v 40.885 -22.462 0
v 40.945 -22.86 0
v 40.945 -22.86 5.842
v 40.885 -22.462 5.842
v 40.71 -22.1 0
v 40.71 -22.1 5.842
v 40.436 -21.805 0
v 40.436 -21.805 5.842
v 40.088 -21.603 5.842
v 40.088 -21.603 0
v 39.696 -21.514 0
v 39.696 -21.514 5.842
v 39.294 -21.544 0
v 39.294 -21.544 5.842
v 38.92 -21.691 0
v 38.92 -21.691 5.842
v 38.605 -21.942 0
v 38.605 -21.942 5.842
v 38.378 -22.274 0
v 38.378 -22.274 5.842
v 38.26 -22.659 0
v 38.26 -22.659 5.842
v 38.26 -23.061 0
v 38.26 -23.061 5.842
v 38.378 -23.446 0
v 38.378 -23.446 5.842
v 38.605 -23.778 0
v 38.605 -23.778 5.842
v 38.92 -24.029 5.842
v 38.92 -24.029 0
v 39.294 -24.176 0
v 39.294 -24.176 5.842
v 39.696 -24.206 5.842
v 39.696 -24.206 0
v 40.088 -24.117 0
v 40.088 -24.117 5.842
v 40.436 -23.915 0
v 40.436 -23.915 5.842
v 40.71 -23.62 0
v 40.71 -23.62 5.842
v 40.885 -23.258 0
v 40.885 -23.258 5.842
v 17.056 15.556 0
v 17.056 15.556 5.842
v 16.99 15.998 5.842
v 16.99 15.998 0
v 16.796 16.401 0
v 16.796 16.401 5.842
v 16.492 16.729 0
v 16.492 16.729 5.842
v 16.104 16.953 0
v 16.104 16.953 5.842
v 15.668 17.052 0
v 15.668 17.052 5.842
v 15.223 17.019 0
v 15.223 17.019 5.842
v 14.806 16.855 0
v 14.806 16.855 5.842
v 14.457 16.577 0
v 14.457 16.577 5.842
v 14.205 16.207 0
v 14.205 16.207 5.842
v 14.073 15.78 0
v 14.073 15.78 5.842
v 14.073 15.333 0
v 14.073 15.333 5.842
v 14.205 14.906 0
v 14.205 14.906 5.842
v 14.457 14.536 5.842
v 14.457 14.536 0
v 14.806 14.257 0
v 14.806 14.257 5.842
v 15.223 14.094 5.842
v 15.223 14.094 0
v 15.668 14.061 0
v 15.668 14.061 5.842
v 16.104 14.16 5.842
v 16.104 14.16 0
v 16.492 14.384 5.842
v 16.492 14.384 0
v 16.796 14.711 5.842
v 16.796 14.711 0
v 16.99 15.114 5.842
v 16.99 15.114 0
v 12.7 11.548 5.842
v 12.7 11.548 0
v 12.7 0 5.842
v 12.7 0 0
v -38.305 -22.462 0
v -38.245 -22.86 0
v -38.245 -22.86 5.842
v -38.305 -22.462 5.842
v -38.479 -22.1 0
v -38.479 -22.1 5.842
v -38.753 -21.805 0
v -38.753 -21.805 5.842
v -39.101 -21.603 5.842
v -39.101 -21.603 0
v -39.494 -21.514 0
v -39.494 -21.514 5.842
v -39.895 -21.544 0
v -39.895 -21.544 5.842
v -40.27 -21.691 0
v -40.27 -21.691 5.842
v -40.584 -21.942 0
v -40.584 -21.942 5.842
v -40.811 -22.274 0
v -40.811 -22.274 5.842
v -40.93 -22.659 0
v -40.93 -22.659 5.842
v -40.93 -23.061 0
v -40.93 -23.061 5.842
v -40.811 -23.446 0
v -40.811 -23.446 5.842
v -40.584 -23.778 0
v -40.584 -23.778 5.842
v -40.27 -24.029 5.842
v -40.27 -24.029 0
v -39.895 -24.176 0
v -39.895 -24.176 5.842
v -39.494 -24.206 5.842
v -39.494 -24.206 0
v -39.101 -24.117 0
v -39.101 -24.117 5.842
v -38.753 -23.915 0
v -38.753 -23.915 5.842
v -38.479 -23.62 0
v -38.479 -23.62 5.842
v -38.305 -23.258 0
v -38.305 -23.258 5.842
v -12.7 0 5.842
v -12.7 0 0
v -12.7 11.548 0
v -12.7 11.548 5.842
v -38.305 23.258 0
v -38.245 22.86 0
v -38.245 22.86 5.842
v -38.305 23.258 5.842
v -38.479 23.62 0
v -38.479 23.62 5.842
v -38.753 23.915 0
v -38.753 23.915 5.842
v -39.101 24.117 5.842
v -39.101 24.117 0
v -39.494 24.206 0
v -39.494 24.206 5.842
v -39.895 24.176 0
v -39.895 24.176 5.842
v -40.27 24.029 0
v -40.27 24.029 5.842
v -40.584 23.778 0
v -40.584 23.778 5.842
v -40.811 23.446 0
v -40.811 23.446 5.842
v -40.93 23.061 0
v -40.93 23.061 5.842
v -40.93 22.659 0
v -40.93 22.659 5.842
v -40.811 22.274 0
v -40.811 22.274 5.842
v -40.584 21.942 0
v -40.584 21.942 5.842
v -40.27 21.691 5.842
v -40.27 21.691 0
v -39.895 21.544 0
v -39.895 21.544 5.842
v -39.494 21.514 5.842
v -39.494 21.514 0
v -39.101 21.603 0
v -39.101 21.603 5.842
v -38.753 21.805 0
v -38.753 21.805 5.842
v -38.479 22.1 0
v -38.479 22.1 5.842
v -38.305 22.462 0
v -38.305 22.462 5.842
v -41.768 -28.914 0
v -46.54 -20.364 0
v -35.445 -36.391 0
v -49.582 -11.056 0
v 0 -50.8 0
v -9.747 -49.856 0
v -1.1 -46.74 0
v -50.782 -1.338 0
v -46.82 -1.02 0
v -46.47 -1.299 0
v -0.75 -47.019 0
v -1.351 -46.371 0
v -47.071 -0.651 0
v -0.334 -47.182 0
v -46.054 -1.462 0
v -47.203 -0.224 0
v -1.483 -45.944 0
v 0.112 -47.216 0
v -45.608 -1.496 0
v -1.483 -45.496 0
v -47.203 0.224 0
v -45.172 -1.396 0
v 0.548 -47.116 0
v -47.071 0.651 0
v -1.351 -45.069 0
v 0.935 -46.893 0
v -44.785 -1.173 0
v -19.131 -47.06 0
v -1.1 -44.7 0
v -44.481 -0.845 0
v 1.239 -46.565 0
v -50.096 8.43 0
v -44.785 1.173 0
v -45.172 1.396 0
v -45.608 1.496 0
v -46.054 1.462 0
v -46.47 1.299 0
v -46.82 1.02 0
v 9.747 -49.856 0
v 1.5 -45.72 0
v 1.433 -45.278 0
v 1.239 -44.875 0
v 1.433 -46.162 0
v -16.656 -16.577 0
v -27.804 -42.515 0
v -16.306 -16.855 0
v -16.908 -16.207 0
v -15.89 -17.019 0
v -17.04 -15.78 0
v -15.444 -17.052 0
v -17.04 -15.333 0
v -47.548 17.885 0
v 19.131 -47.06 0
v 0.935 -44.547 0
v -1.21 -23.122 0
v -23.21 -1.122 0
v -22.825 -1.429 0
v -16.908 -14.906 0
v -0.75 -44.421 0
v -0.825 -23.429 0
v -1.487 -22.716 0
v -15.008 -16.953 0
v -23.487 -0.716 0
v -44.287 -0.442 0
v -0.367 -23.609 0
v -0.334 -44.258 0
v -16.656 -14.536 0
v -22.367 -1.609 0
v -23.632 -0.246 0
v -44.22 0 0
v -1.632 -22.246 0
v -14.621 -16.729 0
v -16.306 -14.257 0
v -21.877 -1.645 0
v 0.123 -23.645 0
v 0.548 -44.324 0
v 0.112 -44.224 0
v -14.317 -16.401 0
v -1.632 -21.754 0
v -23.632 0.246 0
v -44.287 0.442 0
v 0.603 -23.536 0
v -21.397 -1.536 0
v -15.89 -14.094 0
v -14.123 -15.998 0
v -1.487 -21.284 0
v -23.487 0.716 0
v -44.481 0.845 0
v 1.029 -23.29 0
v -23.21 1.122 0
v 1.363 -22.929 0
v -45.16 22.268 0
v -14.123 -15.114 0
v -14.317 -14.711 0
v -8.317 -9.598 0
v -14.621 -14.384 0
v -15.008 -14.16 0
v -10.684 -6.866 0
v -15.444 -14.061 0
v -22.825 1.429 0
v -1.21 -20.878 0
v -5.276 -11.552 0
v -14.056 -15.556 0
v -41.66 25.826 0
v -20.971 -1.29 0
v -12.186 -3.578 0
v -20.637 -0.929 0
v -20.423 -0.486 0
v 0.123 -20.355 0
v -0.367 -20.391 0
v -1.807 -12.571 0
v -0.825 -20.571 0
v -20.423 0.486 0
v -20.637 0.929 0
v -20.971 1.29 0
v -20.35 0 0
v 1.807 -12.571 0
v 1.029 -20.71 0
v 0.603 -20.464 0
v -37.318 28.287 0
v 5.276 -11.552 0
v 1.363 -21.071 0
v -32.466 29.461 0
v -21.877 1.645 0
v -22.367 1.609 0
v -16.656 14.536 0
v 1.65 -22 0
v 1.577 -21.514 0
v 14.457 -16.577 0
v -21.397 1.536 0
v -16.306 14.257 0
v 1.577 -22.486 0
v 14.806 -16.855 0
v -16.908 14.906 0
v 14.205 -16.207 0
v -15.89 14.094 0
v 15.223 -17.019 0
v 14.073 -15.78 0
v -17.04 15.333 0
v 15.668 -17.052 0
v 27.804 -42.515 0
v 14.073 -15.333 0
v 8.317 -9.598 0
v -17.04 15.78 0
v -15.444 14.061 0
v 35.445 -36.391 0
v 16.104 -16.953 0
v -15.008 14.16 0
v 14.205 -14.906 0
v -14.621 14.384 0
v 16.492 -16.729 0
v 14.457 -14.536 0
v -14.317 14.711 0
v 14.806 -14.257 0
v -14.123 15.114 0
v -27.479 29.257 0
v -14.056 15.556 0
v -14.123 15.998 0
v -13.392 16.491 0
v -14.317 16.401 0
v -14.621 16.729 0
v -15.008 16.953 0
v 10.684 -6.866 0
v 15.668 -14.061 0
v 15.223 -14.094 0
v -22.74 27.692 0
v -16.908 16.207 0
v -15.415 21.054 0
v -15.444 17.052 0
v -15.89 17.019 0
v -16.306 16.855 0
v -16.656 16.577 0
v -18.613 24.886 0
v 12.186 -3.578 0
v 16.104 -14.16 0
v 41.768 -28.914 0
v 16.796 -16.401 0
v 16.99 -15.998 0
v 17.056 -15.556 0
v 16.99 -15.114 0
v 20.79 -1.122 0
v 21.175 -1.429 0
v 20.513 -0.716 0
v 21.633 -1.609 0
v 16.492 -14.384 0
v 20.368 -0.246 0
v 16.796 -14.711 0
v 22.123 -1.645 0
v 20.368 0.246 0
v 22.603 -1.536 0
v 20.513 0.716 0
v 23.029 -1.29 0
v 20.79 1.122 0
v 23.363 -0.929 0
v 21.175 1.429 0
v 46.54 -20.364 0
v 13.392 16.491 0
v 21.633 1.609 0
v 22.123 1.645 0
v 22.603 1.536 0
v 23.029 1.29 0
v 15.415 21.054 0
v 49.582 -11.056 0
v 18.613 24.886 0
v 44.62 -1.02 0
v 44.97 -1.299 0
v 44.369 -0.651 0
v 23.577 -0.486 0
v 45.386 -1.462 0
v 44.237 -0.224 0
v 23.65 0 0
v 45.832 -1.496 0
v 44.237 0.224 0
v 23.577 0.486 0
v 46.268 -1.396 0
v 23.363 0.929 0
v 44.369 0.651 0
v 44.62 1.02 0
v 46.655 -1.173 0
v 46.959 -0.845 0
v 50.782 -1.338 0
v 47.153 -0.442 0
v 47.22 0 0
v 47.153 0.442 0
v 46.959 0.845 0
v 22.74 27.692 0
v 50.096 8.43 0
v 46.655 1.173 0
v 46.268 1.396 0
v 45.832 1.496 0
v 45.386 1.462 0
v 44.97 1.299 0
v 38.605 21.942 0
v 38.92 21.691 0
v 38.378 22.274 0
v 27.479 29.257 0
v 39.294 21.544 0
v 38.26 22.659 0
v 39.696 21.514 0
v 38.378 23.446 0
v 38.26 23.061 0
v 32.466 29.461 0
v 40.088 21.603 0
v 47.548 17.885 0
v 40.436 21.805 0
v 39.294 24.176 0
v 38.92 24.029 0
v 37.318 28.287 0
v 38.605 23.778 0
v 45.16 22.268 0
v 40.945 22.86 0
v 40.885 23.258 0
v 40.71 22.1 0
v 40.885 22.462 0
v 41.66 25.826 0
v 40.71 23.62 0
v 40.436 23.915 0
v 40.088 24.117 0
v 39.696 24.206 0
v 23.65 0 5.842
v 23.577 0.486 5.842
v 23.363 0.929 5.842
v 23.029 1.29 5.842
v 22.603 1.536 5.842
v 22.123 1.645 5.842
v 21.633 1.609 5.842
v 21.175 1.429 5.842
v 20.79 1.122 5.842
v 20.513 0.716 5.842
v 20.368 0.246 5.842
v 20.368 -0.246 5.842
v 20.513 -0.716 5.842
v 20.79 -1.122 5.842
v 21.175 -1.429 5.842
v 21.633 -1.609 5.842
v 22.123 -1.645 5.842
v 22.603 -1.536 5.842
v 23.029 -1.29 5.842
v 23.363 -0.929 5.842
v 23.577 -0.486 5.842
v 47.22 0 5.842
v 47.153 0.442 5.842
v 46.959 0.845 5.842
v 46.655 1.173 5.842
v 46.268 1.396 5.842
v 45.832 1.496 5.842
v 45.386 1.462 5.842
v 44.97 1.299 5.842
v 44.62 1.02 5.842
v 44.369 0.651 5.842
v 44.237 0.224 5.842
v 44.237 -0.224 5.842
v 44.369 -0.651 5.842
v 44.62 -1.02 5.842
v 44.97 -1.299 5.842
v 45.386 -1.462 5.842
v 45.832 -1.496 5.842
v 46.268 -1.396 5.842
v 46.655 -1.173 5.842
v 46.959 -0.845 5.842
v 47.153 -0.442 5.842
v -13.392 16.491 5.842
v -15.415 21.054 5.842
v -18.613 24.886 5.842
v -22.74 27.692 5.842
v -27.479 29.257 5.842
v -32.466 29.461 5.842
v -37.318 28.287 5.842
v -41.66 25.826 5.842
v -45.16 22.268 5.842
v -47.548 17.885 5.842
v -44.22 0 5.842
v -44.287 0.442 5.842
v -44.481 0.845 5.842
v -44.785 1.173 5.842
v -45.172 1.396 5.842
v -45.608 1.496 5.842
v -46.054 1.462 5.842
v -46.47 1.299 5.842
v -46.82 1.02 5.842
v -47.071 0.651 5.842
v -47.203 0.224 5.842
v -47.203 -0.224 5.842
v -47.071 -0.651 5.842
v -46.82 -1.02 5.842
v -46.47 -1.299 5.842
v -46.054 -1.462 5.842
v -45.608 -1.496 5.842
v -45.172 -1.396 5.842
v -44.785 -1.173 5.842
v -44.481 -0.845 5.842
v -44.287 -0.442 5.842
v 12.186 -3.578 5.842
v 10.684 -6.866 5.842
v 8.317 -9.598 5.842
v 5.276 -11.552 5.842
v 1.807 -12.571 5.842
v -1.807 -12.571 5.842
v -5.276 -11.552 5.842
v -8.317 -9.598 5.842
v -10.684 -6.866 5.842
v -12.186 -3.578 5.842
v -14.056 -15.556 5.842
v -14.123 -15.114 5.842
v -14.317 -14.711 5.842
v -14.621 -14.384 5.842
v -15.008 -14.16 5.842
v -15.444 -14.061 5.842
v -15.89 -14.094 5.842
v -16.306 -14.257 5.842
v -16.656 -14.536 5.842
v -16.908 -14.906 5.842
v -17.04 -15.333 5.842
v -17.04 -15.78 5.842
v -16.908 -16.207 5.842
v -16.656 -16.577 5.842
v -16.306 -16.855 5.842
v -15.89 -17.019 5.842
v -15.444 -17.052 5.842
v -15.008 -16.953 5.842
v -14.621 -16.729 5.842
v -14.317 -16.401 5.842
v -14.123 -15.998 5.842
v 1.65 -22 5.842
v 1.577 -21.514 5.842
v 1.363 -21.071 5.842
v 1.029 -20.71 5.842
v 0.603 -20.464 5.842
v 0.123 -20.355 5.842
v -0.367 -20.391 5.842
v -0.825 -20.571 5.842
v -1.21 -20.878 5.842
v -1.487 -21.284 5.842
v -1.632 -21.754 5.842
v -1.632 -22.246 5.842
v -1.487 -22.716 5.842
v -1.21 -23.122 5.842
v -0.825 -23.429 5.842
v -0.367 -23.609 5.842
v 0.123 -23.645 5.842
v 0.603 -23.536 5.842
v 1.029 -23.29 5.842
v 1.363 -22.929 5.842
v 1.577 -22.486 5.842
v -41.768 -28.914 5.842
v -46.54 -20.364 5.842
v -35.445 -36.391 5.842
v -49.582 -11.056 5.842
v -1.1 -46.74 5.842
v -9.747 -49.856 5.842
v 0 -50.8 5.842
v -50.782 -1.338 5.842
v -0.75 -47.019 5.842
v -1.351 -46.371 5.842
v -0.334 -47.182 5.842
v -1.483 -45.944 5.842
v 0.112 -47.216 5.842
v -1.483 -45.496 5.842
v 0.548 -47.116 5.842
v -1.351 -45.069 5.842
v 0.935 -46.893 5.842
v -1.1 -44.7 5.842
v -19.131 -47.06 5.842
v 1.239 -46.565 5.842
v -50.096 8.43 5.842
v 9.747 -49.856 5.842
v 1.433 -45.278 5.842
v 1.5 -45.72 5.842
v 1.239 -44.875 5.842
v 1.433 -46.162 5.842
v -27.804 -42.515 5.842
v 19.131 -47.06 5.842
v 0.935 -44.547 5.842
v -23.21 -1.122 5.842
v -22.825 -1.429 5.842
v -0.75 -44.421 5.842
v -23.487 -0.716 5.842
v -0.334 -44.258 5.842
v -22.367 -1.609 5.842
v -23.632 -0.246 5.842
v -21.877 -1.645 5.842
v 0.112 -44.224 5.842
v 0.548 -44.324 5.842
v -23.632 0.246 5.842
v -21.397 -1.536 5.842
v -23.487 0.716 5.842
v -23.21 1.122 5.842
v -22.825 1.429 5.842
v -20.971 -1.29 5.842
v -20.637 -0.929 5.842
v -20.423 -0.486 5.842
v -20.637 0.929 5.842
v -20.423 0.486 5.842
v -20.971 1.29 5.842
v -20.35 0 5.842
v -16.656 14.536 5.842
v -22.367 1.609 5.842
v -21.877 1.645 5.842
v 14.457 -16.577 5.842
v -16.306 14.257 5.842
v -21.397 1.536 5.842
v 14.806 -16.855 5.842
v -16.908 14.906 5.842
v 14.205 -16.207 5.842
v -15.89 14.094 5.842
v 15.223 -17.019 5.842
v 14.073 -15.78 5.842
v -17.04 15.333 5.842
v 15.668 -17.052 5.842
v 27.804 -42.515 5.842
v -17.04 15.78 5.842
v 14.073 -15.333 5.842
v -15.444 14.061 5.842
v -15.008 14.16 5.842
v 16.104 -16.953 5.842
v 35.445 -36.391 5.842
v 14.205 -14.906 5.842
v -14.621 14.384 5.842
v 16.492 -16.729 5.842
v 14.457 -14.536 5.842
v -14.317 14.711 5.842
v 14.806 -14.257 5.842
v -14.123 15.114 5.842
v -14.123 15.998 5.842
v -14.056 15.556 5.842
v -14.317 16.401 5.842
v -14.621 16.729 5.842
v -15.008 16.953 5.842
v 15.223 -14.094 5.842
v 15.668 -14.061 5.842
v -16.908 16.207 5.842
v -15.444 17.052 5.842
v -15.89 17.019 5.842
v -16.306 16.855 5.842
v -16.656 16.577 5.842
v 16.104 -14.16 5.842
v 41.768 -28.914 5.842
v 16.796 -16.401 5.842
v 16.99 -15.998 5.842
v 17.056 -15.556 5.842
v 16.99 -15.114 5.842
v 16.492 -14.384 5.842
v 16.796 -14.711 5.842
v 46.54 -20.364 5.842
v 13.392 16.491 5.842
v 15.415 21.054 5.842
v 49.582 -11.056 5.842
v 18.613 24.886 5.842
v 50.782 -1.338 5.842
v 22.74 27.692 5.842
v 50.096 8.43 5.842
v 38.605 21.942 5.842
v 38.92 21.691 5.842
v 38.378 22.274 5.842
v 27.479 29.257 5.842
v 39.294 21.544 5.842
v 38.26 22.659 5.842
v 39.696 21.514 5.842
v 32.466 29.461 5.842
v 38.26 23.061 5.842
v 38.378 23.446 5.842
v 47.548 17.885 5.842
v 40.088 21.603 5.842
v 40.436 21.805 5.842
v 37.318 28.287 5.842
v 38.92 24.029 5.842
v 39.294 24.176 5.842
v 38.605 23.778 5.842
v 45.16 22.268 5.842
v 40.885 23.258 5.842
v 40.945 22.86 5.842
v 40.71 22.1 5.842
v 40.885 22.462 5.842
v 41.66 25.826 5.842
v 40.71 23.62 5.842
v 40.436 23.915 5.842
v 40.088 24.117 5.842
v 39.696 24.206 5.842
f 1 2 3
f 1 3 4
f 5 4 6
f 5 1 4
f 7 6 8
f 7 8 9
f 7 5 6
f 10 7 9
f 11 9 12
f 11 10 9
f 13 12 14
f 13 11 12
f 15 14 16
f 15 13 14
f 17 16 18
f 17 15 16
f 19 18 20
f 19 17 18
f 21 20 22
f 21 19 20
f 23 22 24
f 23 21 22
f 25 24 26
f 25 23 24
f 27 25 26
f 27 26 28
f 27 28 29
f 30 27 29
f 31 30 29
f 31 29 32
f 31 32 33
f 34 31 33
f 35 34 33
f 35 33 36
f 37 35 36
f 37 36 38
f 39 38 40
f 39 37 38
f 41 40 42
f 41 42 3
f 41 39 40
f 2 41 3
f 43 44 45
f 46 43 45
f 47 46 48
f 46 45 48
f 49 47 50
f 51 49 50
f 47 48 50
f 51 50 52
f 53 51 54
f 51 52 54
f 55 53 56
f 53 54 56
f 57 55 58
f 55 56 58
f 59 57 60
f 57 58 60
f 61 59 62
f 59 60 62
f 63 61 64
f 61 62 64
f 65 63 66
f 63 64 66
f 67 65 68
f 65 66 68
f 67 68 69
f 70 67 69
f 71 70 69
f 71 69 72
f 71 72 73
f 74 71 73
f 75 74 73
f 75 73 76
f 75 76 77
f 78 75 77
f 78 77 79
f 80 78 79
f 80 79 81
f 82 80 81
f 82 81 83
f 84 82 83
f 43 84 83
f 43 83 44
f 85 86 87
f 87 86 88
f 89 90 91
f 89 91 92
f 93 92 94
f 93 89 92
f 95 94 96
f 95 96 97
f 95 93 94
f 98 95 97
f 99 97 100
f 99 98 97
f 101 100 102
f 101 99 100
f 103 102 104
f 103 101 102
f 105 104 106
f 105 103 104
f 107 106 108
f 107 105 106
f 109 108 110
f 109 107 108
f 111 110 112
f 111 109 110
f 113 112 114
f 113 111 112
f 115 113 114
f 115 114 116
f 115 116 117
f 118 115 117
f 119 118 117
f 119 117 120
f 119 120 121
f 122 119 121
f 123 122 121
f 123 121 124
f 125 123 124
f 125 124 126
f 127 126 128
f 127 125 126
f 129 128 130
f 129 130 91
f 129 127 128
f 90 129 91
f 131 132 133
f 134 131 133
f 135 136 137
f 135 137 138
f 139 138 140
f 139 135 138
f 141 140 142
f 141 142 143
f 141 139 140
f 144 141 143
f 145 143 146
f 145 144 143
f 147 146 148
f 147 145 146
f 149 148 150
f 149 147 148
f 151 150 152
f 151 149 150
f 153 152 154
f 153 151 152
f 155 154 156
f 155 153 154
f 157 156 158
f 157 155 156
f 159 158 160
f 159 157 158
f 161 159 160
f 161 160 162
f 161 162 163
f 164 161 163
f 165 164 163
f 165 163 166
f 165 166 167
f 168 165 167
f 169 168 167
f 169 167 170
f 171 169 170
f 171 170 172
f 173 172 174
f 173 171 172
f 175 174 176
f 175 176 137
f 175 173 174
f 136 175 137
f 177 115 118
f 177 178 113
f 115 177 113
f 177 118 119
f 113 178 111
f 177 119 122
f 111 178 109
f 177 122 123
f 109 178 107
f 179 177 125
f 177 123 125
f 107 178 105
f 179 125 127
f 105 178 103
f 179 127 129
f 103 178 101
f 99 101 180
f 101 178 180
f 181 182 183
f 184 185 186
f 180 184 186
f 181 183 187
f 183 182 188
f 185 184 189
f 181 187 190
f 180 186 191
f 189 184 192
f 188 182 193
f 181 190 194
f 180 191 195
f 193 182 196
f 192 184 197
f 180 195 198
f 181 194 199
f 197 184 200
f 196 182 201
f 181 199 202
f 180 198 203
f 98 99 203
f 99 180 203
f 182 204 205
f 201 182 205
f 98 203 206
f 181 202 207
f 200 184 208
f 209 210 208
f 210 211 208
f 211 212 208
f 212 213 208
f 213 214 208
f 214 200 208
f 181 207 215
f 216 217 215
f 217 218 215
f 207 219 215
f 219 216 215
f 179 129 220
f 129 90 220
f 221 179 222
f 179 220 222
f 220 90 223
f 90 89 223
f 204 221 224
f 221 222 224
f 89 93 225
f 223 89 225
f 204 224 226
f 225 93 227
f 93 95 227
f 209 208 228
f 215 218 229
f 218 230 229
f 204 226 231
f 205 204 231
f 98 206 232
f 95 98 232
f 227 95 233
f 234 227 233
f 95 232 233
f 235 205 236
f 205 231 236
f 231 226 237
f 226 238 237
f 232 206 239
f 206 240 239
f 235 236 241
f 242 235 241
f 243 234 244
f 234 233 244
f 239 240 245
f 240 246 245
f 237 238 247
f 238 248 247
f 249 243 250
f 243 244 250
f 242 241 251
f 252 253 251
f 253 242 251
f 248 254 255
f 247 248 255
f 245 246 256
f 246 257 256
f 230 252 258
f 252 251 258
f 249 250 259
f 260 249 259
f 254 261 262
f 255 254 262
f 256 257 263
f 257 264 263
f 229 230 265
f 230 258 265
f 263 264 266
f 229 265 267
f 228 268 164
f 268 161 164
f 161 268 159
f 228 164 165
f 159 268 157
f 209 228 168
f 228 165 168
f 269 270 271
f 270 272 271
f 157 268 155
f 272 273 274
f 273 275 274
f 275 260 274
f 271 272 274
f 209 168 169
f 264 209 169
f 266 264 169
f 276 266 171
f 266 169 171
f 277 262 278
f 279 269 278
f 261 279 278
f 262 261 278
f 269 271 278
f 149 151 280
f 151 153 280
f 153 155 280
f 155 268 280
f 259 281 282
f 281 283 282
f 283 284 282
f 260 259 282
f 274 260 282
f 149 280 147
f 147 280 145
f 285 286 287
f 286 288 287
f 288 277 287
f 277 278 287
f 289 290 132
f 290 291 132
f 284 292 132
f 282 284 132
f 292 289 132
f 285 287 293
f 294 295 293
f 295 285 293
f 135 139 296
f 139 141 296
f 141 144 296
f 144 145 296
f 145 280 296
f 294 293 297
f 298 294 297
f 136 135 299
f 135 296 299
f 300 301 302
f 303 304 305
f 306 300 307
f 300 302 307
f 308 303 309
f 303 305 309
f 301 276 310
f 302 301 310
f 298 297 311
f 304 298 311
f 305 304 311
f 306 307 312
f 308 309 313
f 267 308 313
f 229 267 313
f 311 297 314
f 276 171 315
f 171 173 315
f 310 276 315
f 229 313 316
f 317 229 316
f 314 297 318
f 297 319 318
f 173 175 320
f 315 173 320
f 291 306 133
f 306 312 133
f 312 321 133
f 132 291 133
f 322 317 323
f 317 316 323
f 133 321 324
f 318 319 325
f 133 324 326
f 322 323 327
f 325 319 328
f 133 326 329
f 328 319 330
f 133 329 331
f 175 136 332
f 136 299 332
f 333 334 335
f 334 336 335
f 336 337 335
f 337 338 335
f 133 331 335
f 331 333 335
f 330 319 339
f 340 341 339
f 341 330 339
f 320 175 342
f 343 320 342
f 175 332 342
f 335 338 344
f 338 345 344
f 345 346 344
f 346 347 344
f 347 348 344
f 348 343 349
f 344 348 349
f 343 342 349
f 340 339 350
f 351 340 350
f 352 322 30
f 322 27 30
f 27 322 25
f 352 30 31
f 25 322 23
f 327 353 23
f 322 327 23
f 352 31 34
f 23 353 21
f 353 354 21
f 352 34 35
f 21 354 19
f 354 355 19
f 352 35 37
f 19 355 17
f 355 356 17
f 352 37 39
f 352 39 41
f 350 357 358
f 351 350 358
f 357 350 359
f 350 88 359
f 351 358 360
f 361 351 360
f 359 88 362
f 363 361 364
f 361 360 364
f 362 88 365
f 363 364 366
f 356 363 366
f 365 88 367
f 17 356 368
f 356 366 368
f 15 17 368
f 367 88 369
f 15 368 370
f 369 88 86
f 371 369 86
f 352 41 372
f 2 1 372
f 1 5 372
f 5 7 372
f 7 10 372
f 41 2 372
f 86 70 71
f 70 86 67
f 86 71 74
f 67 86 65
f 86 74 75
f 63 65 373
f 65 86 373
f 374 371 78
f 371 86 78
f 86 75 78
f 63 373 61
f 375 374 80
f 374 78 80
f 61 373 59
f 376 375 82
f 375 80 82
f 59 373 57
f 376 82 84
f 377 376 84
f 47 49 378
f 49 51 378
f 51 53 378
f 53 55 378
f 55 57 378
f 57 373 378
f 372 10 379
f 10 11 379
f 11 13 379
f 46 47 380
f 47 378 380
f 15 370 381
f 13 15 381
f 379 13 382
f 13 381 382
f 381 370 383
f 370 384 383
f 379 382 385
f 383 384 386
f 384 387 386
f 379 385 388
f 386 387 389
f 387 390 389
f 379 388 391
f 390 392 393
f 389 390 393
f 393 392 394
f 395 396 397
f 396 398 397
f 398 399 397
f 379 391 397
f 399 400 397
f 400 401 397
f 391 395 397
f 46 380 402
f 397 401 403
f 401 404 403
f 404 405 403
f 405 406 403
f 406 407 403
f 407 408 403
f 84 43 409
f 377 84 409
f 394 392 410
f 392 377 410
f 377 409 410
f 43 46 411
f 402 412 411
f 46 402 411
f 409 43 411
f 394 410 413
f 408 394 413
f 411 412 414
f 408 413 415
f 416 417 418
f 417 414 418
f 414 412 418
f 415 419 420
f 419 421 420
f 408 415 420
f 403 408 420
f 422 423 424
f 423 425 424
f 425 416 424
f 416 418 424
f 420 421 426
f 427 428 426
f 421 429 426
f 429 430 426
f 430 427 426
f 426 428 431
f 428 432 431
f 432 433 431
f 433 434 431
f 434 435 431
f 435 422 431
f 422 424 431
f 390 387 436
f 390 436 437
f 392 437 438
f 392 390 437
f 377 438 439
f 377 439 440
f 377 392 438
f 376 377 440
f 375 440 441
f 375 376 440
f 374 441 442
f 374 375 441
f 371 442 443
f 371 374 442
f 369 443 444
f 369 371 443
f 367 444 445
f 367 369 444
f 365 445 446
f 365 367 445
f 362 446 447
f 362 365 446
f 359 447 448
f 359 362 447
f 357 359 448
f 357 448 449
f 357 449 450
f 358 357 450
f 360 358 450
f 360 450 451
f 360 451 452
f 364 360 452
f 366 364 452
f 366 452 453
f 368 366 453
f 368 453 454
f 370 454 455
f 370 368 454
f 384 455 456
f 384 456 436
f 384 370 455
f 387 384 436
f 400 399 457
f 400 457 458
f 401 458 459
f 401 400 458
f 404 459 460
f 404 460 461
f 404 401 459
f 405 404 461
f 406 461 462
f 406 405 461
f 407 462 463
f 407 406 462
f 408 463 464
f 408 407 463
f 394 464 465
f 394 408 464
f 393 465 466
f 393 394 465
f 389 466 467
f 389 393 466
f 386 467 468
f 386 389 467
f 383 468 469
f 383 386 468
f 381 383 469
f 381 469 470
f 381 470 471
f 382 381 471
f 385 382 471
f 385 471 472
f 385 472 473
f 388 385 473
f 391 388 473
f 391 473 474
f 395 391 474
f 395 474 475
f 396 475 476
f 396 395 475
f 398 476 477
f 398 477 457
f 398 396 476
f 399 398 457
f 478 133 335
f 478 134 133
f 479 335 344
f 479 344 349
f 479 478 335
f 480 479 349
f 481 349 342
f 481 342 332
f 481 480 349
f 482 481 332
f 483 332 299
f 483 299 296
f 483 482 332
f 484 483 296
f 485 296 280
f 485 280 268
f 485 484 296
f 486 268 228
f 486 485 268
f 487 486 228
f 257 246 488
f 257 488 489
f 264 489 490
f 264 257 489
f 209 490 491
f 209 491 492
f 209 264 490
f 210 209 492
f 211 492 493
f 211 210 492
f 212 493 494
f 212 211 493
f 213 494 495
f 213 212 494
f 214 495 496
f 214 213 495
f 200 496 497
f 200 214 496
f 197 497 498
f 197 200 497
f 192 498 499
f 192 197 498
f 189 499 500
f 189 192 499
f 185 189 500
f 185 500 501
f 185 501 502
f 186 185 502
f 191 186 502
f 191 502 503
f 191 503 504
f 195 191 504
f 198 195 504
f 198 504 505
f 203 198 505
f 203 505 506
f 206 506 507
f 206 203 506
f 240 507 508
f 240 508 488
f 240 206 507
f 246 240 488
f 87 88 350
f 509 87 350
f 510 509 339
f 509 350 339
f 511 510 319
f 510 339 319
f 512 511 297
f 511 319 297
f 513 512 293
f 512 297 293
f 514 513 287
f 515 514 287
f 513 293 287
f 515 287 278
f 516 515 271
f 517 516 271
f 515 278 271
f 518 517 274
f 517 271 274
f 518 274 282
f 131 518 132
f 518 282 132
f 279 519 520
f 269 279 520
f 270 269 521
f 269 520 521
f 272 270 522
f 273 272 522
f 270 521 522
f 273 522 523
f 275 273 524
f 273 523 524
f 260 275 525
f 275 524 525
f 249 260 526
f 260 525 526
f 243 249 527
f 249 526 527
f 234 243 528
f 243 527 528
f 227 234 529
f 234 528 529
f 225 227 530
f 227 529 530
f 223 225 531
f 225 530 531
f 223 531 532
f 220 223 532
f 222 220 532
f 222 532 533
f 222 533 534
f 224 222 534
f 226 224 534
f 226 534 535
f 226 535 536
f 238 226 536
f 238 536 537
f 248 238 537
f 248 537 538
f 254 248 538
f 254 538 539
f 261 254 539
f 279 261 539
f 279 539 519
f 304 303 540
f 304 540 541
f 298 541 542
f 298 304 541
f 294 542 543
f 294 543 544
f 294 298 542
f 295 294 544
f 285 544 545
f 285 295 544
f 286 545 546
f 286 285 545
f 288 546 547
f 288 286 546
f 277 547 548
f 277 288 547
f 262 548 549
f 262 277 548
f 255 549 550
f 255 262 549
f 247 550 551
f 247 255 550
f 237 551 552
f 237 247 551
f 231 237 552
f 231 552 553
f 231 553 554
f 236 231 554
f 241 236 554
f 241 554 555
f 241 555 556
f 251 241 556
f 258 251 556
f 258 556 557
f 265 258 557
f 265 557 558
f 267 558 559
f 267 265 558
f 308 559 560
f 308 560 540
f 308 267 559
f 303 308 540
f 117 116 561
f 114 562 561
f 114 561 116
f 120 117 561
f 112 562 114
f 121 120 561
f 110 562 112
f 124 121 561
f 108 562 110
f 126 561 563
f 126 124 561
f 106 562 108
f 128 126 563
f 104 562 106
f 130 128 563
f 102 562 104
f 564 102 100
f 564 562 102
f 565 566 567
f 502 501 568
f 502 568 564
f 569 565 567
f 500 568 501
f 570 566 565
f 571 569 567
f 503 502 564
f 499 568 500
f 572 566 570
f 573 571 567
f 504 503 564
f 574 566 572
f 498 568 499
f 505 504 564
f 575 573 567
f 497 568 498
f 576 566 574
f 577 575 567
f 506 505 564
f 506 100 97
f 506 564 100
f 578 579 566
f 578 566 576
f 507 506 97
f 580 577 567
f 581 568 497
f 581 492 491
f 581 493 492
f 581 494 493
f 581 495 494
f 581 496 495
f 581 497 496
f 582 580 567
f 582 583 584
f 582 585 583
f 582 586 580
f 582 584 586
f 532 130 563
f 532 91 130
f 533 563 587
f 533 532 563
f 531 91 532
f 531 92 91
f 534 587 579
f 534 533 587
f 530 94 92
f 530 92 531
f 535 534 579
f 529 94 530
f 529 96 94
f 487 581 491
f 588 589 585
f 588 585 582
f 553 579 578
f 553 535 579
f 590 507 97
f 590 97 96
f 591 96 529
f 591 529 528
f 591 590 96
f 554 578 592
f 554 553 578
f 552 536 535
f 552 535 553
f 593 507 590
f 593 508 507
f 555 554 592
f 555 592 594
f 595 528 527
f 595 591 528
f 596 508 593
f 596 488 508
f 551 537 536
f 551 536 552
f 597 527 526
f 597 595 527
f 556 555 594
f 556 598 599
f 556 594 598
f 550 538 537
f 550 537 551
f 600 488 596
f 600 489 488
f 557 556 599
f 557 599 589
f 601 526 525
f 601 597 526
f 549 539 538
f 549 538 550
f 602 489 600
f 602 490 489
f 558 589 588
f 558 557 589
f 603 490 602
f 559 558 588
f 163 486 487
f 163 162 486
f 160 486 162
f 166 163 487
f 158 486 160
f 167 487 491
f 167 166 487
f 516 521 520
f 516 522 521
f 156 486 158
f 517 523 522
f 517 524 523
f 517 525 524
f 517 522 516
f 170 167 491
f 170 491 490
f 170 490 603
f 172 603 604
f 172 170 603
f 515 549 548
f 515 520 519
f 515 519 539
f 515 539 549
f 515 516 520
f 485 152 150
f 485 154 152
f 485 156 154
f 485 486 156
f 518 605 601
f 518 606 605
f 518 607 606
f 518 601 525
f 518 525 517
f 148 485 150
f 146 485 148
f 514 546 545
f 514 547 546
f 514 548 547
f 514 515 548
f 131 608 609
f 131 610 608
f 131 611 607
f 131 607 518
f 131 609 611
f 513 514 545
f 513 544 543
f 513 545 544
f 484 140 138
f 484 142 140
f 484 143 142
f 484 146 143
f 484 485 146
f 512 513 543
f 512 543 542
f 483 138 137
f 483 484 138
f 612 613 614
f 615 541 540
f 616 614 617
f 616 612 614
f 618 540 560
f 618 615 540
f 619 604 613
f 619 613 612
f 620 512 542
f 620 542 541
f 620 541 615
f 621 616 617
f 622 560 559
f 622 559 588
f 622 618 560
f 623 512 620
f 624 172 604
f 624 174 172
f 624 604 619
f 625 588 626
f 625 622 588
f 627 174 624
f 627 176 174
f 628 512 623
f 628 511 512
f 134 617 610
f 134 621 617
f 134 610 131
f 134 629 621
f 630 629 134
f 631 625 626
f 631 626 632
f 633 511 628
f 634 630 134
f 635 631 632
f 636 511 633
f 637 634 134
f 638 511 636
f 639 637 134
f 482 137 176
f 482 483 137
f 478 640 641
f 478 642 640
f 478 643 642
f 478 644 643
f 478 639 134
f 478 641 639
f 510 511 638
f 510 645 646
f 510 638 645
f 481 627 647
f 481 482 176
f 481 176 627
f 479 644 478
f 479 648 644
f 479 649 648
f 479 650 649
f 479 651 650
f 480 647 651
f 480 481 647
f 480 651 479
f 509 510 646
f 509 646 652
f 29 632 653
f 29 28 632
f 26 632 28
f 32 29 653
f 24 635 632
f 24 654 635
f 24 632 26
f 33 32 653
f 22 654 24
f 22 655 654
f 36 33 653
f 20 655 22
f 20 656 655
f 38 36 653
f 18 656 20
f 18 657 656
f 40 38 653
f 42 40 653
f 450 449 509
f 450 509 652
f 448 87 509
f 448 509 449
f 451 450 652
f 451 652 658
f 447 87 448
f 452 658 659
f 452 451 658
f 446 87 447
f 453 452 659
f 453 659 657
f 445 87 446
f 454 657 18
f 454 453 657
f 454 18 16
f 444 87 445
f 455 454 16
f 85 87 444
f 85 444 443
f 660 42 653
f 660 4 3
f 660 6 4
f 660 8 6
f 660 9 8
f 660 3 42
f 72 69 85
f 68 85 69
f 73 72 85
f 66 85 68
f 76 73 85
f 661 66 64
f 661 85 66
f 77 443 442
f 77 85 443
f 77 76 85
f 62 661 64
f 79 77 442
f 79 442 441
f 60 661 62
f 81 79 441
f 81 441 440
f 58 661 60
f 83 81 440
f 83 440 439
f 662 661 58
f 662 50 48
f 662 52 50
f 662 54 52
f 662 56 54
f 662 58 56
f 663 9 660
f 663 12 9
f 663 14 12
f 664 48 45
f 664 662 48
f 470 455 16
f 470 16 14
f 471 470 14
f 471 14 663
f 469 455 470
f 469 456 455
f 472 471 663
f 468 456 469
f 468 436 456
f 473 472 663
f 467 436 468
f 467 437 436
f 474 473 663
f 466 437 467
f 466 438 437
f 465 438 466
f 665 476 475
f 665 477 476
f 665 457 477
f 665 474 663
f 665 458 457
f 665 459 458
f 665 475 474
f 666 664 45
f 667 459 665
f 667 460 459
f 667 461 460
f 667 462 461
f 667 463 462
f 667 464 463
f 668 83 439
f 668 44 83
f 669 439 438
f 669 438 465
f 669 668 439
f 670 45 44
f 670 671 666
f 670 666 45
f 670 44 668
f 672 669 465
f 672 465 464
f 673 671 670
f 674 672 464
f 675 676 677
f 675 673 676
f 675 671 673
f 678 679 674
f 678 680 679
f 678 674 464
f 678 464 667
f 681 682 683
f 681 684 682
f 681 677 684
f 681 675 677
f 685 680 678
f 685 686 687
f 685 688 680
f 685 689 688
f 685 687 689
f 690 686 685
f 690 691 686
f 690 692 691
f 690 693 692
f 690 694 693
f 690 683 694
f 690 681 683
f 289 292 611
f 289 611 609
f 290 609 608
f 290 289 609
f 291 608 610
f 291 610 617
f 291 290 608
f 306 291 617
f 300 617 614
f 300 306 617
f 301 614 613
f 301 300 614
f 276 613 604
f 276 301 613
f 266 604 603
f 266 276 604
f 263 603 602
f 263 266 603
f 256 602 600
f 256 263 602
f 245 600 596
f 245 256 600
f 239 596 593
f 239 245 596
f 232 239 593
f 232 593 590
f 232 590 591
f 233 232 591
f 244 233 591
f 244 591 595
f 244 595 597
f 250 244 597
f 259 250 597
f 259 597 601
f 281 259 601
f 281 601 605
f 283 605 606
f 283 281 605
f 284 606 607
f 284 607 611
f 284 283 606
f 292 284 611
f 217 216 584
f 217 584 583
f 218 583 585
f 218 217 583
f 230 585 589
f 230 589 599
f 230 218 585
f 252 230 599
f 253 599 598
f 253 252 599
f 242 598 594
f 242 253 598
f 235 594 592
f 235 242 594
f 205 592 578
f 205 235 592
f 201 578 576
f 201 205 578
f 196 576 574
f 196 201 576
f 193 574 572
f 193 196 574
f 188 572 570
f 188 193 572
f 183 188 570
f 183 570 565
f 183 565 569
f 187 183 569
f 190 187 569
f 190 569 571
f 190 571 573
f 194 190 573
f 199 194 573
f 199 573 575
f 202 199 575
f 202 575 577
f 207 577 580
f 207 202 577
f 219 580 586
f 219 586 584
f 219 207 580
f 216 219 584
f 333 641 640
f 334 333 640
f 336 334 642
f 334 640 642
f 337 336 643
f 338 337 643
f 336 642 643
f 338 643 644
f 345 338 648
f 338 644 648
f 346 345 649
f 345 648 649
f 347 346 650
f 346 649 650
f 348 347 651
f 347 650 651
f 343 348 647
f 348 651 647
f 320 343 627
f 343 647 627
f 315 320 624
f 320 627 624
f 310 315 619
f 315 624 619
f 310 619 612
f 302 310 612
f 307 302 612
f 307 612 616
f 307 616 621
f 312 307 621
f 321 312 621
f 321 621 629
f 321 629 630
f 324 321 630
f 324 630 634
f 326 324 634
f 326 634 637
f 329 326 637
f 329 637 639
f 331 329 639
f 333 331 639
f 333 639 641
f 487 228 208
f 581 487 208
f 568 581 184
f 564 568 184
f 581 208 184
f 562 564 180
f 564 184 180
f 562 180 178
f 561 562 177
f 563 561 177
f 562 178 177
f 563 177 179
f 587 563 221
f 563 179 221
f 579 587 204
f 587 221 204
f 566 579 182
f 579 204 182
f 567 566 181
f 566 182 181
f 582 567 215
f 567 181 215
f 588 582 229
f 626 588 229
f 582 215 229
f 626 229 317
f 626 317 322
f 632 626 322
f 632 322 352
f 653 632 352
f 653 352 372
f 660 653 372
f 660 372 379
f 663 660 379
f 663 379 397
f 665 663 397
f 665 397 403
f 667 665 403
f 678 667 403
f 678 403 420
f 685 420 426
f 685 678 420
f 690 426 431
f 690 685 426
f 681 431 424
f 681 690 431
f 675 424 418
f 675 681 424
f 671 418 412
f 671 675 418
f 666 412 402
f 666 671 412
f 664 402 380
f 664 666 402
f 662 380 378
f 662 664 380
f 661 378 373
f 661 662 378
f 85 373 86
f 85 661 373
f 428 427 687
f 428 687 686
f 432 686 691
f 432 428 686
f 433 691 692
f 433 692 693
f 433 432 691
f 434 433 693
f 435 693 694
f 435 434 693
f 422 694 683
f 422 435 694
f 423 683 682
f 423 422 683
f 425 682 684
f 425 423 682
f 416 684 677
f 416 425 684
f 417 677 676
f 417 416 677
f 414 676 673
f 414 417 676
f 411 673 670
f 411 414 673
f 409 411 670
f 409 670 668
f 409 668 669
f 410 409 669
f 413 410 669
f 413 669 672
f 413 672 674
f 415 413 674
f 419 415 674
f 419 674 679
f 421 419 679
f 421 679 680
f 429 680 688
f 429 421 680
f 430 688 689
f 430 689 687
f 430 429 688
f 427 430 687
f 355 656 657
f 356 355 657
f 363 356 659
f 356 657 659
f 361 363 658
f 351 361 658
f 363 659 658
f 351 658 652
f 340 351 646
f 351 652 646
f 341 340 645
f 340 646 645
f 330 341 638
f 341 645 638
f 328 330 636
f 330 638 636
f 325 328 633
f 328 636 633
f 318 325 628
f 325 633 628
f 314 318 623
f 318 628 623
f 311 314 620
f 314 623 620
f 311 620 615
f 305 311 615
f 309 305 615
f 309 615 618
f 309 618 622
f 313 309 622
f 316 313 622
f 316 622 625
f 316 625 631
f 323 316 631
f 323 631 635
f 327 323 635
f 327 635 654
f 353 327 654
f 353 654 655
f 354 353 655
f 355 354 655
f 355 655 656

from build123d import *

# Parameters (mm, degrees)
SKETCH1_R           = 1.65
SKETCH1_R_2         = 1.5
SKETCH1_R_3         = 1.35
BOSS_EXTRUDE1_DEPTH = 5.842
FILLET1_R           = 18
SKETCH2_R           = 1.5
CUT_EXTRUDE1_DEPTH  = 73.079185373


with BuildPart() as part:
    # Sketch1 → Boss-Extrude1 (new body)
    with BuildSketch(Plane.XY):
        with BuildLine():
            Line((-12.7, 0), (-12.7, 49.186888497))
            ThreePointArc((-12.7, 49.186888497), (0, -50.8), (12.7, 49.186888497))
            Line((12.7, 49.186888497), (12.7, 0))
            ThreePointArc((12.7, 0), (0, -12.7), (-12.7, 0))
        make_face()
        with Locations((22, 0)):
            Circle(SKETCH1_R, mode=Mode.SUBTRACT)
        with Locations((0, -22)):
            Circle(SKETCH1_R, mode=Mode.SUBTRACT)
        with Locations((-22, 0)):
            Circle(SKETCH1_R, mode=Mode.SUBTRACT)
        with Locations((-45.72, 0)):
            Circle(SKETCH1_R_2, mode=Mode.SUBTRACT)
        with Locations((45.72, 0)):
            Circle(SKETCH1_R_2, mode=Mode.SUBTRACT)
        with Locations((0, -45.72)):
            Circle(SKETCH1_R_2, mode=Mode.SUBTRACT)
        with Locations((39.594681461, 22.86)):
            Circle(SKETCH1_R_3, mode=Mode.SUBTRACT)
        with Locations((39.594681461, -22.86)):
            Circle(SKETCH1_R_3, mode=Mode.SUBTRACT)
        with Locations((-39.594681461, -22.86)):
            Circle(SKETCH1_R_3, mode=Mode.SUBTRACT)
        with Locations((-39.594681461, 22.86)):
            Circle(SKETCH1_R_3, mode=Mode.SUBTRACT)
    extrude(amount=BOSS_EXTRUDE1_DEPTH)

    # Fillet1
    fillet1_edges = [part.edges().sort_by_distance(p)[0] for p in [
        (12.7, 49.186888497, 2.921),
        (-12.7, 49.186888497, 2.921),
    ]]
    fillet(fillet1_edges, radius=FILLET1_R)

    # Sketch2 → Cut-Extrude1 (cut, through all)
    with BuildSketch(Plane.XY.offset(5.842)):
        with Locations((-15.556349186, -15.556349186)):
            Circle(SKETCH2_R)
        with Locations((-15.556349186, 15.556349186)):
            Circle(SKETCH2_R)
        with Locations((15.556349186, 15.556349186)):
            Circle(SKETCH2_R)
        with Locations((15.556349186, -15.556349186)):
            Circle(SKETCH2_R)
    extrude(amount=-CUT_EXTRUDE1_DEPTH, mode=Mode.SUBTRACT)


solid = part.part
